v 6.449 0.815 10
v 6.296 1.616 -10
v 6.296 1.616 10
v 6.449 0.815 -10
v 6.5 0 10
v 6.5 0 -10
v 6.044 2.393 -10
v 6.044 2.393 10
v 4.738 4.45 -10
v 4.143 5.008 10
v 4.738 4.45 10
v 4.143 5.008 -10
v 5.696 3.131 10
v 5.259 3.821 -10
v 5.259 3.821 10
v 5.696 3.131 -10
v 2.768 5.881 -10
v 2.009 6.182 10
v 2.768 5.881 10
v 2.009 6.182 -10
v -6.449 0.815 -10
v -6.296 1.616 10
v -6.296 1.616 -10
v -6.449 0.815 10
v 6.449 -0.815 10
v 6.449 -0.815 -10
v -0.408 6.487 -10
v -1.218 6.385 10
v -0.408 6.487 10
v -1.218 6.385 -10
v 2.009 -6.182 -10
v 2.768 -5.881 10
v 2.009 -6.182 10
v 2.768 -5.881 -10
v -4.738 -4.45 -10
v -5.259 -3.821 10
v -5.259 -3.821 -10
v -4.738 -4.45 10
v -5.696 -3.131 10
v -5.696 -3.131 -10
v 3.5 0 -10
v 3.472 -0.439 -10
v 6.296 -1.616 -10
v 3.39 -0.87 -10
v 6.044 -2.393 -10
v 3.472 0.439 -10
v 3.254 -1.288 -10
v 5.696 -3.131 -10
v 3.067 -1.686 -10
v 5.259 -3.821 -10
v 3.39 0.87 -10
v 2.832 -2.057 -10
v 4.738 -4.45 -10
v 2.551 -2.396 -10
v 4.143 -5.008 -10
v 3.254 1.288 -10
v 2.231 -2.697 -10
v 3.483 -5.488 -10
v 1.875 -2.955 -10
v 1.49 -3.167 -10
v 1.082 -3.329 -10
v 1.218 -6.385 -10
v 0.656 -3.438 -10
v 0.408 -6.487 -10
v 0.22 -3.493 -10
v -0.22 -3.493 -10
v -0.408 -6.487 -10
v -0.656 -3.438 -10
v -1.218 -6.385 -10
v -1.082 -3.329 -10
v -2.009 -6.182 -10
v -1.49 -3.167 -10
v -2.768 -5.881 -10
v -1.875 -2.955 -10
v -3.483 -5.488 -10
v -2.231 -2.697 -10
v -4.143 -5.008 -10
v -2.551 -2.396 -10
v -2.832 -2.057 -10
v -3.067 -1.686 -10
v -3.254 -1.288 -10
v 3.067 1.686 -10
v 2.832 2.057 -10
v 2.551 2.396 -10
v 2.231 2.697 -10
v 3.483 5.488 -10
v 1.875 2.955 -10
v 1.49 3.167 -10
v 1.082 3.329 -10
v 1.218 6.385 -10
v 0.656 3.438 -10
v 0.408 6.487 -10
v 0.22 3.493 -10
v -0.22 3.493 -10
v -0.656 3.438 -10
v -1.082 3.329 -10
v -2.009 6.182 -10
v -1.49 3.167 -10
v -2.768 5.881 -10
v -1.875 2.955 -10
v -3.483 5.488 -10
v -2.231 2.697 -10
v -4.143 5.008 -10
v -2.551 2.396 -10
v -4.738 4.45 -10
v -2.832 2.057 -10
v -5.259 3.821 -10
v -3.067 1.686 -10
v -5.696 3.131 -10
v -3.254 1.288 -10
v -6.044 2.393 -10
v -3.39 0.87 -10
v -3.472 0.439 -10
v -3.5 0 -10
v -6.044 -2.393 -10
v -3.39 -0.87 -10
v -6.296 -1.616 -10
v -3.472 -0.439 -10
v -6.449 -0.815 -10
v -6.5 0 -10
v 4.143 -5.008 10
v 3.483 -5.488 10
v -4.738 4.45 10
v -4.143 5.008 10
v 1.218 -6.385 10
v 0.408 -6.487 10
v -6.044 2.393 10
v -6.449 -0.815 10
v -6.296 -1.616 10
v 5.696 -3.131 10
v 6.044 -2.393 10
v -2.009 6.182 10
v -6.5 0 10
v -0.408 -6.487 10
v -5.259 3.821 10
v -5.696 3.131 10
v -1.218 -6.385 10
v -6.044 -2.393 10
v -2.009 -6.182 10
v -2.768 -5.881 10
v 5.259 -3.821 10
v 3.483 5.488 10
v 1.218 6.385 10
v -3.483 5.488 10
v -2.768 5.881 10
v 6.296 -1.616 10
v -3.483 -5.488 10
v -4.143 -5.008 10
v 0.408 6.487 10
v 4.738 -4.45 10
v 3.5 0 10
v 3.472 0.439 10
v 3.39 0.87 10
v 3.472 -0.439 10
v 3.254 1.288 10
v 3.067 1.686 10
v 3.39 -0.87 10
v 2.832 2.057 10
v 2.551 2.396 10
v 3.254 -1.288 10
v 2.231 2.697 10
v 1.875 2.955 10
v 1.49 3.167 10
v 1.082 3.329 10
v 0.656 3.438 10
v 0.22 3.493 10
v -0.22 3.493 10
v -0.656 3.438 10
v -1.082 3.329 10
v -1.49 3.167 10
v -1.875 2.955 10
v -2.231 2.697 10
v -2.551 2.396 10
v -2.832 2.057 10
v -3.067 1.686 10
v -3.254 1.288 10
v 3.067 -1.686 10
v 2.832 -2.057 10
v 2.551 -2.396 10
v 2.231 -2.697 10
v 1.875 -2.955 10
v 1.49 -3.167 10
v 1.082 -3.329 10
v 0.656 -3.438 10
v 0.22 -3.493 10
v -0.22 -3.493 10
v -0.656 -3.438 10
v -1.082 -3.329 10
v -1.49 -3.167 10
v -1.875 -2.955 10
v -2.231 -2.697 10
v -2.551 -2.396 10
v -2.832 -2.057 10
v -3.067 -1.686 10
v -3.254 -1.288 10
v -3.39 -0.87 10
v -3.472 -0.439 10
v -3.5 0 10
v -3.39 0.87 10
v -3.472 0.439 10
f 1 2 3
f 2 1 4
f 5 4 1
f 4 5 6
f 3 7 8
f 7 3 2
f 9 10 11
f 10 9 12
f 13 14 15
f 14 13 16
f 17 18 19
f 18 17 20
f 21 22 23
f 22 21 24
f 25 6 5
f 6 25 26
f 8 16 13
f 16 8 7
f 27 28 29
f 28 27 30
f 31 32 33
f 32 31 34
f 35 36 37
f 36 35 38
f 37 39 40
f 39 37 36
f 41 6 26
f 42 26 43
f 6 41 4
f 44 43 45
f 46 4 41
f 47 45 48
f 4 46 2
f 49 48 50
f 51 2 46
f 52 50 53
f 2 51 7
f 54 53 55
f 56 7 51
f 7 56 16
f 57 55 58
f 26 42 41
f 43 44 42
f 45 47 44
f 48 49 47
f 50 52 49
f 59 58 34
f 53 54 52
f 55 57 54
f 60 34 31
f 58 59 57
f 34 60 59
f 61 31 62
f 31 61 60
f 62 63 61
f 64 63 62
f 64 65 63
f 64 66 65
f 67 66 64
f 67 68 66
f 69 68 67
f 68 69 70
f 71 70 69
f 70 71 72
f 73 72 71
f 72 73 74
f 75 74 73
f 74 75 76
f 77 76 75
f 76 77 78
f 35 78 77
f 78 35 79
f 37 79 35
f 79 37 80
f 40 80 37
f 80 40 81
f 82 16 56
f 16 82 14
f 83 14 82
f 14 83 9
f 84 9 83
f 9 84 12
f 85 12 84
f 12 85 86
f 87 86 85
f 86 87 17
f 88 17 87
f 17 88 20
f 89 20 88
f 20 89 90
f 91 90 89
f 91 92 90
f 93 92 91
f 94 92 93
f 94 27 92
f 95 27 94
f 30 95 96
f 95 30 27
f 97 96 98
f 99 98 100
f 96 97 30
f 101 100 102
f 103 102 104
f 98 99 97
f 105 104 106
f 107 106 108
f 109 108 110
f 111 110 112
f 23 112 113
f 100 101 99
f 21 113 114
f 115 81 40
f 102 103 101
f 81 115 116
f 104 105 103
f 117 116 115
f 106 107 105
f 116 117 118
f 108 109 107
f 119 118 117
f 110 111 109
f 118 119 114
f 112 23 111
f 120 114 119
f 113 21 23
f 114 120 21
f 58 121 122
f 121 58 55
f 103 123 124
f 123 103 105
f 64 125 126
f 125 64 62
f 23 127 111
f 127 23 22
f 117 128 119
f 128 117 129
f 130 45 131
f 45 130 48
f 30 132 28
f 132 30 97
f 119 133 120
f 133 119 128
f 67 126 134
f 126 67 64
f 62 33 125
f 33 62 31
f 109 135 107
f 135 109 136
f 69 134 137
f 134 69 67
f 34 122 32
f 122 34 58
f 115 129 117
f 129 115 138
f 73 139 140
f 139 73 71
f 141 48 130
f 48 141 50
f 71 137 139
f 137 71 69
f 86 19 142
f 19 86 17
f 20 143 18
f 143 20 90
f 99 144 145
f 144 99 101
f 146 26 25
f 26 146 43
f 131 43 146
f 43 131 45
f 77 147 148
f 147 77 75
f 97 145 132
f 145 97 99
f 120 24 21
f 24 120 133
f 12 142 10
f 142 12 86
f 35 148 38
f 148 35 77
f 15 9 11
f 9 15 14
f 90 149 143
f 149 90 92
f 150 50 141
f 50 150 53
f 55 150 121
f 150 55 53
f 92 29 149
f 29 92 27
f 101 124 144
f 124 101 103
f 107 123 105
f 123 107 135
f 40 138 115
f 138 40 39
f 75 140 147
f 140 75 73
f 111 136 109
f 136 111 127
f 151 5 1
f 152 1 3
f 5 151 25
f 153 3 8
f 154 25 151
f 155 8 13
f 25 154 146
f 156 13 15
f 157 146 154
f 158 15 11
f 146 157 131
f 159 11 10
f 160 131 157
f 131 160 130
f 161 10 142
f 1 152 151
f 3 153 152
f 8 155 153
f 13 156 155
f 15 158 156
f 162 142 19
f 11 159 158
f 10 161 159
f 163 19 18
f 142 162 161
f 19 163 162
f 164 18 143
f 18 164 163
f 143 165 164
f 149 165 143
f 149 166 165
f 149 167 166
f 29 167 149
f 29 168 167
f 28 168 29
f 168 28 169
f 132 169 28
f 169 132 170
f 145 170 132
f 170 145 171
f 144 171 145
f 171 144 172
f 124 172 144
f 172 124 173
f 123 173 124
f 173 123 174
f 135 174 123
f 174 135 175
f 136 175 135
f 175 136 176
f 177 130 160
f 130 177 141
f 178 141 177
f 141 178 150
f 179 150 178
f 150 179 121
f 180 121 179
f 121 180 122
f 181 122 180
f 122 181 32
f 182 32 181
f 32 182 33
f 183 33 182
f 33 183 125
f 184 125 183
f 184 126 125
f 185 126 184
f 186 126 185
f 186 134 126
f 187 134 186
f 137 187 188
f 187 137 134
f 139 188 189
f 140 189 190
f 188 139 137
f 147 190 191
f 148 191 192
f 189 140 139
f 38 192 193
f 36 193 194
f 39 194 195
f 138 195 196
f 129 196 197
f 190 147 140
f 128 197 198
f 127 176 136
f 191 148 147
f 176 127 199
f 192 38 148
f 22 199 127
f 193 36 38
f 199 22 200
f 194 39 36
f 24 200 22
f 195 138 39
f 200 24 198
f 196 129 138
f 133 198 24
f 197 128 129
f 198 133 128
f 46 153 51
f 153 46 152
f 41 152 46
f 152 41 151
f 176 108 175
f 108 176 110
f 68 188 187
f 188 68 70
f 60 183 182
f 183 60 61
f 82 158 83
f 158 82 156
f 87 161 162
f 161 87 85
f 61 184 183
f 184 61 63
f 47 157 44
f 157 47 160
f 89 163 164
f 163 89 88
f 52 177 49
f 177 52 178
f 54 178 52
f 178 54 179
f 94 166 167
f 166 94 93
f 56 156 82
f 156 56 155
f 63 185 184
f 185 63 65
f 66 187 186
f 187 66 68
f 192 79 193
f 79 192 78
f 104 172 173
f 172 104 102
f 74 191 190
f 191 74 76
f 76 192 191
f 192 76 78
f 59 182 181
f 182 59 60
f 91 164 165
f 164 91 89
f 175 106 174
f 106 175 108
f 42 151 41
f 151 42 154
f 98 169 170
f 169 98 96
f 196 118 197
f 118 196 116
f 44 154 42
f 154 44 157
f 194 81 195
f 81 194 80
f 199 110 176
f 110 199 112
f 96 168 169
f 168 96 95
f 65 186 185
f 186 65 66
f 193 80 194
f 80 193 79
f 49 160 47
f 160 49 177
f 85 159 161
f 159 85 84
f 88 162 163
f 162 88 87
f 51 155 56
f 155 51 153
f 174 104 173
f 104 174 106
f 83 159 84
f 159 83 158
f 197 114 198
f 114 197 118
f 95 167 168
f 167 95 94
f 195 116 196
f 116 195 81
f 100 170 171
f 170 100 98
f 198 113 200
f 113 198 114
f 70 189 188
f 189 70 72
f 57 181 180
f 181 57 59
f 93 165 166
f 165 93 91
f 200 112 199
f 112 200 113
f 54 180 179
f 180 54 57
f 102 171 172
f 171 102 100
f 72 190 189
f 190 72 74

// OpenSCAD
$fn = 50;


difference() {
	union() {
		translate(v = [0, 0, -10.0000000000]) {
			cylinder(h = 20, r = 6.5000000000);
		}
	}
	union() {
		translate(v = [0, 0, -100.0000000000]) {
			cylinder(h = 200, r = 3.5000000000);
		}
	}
}
